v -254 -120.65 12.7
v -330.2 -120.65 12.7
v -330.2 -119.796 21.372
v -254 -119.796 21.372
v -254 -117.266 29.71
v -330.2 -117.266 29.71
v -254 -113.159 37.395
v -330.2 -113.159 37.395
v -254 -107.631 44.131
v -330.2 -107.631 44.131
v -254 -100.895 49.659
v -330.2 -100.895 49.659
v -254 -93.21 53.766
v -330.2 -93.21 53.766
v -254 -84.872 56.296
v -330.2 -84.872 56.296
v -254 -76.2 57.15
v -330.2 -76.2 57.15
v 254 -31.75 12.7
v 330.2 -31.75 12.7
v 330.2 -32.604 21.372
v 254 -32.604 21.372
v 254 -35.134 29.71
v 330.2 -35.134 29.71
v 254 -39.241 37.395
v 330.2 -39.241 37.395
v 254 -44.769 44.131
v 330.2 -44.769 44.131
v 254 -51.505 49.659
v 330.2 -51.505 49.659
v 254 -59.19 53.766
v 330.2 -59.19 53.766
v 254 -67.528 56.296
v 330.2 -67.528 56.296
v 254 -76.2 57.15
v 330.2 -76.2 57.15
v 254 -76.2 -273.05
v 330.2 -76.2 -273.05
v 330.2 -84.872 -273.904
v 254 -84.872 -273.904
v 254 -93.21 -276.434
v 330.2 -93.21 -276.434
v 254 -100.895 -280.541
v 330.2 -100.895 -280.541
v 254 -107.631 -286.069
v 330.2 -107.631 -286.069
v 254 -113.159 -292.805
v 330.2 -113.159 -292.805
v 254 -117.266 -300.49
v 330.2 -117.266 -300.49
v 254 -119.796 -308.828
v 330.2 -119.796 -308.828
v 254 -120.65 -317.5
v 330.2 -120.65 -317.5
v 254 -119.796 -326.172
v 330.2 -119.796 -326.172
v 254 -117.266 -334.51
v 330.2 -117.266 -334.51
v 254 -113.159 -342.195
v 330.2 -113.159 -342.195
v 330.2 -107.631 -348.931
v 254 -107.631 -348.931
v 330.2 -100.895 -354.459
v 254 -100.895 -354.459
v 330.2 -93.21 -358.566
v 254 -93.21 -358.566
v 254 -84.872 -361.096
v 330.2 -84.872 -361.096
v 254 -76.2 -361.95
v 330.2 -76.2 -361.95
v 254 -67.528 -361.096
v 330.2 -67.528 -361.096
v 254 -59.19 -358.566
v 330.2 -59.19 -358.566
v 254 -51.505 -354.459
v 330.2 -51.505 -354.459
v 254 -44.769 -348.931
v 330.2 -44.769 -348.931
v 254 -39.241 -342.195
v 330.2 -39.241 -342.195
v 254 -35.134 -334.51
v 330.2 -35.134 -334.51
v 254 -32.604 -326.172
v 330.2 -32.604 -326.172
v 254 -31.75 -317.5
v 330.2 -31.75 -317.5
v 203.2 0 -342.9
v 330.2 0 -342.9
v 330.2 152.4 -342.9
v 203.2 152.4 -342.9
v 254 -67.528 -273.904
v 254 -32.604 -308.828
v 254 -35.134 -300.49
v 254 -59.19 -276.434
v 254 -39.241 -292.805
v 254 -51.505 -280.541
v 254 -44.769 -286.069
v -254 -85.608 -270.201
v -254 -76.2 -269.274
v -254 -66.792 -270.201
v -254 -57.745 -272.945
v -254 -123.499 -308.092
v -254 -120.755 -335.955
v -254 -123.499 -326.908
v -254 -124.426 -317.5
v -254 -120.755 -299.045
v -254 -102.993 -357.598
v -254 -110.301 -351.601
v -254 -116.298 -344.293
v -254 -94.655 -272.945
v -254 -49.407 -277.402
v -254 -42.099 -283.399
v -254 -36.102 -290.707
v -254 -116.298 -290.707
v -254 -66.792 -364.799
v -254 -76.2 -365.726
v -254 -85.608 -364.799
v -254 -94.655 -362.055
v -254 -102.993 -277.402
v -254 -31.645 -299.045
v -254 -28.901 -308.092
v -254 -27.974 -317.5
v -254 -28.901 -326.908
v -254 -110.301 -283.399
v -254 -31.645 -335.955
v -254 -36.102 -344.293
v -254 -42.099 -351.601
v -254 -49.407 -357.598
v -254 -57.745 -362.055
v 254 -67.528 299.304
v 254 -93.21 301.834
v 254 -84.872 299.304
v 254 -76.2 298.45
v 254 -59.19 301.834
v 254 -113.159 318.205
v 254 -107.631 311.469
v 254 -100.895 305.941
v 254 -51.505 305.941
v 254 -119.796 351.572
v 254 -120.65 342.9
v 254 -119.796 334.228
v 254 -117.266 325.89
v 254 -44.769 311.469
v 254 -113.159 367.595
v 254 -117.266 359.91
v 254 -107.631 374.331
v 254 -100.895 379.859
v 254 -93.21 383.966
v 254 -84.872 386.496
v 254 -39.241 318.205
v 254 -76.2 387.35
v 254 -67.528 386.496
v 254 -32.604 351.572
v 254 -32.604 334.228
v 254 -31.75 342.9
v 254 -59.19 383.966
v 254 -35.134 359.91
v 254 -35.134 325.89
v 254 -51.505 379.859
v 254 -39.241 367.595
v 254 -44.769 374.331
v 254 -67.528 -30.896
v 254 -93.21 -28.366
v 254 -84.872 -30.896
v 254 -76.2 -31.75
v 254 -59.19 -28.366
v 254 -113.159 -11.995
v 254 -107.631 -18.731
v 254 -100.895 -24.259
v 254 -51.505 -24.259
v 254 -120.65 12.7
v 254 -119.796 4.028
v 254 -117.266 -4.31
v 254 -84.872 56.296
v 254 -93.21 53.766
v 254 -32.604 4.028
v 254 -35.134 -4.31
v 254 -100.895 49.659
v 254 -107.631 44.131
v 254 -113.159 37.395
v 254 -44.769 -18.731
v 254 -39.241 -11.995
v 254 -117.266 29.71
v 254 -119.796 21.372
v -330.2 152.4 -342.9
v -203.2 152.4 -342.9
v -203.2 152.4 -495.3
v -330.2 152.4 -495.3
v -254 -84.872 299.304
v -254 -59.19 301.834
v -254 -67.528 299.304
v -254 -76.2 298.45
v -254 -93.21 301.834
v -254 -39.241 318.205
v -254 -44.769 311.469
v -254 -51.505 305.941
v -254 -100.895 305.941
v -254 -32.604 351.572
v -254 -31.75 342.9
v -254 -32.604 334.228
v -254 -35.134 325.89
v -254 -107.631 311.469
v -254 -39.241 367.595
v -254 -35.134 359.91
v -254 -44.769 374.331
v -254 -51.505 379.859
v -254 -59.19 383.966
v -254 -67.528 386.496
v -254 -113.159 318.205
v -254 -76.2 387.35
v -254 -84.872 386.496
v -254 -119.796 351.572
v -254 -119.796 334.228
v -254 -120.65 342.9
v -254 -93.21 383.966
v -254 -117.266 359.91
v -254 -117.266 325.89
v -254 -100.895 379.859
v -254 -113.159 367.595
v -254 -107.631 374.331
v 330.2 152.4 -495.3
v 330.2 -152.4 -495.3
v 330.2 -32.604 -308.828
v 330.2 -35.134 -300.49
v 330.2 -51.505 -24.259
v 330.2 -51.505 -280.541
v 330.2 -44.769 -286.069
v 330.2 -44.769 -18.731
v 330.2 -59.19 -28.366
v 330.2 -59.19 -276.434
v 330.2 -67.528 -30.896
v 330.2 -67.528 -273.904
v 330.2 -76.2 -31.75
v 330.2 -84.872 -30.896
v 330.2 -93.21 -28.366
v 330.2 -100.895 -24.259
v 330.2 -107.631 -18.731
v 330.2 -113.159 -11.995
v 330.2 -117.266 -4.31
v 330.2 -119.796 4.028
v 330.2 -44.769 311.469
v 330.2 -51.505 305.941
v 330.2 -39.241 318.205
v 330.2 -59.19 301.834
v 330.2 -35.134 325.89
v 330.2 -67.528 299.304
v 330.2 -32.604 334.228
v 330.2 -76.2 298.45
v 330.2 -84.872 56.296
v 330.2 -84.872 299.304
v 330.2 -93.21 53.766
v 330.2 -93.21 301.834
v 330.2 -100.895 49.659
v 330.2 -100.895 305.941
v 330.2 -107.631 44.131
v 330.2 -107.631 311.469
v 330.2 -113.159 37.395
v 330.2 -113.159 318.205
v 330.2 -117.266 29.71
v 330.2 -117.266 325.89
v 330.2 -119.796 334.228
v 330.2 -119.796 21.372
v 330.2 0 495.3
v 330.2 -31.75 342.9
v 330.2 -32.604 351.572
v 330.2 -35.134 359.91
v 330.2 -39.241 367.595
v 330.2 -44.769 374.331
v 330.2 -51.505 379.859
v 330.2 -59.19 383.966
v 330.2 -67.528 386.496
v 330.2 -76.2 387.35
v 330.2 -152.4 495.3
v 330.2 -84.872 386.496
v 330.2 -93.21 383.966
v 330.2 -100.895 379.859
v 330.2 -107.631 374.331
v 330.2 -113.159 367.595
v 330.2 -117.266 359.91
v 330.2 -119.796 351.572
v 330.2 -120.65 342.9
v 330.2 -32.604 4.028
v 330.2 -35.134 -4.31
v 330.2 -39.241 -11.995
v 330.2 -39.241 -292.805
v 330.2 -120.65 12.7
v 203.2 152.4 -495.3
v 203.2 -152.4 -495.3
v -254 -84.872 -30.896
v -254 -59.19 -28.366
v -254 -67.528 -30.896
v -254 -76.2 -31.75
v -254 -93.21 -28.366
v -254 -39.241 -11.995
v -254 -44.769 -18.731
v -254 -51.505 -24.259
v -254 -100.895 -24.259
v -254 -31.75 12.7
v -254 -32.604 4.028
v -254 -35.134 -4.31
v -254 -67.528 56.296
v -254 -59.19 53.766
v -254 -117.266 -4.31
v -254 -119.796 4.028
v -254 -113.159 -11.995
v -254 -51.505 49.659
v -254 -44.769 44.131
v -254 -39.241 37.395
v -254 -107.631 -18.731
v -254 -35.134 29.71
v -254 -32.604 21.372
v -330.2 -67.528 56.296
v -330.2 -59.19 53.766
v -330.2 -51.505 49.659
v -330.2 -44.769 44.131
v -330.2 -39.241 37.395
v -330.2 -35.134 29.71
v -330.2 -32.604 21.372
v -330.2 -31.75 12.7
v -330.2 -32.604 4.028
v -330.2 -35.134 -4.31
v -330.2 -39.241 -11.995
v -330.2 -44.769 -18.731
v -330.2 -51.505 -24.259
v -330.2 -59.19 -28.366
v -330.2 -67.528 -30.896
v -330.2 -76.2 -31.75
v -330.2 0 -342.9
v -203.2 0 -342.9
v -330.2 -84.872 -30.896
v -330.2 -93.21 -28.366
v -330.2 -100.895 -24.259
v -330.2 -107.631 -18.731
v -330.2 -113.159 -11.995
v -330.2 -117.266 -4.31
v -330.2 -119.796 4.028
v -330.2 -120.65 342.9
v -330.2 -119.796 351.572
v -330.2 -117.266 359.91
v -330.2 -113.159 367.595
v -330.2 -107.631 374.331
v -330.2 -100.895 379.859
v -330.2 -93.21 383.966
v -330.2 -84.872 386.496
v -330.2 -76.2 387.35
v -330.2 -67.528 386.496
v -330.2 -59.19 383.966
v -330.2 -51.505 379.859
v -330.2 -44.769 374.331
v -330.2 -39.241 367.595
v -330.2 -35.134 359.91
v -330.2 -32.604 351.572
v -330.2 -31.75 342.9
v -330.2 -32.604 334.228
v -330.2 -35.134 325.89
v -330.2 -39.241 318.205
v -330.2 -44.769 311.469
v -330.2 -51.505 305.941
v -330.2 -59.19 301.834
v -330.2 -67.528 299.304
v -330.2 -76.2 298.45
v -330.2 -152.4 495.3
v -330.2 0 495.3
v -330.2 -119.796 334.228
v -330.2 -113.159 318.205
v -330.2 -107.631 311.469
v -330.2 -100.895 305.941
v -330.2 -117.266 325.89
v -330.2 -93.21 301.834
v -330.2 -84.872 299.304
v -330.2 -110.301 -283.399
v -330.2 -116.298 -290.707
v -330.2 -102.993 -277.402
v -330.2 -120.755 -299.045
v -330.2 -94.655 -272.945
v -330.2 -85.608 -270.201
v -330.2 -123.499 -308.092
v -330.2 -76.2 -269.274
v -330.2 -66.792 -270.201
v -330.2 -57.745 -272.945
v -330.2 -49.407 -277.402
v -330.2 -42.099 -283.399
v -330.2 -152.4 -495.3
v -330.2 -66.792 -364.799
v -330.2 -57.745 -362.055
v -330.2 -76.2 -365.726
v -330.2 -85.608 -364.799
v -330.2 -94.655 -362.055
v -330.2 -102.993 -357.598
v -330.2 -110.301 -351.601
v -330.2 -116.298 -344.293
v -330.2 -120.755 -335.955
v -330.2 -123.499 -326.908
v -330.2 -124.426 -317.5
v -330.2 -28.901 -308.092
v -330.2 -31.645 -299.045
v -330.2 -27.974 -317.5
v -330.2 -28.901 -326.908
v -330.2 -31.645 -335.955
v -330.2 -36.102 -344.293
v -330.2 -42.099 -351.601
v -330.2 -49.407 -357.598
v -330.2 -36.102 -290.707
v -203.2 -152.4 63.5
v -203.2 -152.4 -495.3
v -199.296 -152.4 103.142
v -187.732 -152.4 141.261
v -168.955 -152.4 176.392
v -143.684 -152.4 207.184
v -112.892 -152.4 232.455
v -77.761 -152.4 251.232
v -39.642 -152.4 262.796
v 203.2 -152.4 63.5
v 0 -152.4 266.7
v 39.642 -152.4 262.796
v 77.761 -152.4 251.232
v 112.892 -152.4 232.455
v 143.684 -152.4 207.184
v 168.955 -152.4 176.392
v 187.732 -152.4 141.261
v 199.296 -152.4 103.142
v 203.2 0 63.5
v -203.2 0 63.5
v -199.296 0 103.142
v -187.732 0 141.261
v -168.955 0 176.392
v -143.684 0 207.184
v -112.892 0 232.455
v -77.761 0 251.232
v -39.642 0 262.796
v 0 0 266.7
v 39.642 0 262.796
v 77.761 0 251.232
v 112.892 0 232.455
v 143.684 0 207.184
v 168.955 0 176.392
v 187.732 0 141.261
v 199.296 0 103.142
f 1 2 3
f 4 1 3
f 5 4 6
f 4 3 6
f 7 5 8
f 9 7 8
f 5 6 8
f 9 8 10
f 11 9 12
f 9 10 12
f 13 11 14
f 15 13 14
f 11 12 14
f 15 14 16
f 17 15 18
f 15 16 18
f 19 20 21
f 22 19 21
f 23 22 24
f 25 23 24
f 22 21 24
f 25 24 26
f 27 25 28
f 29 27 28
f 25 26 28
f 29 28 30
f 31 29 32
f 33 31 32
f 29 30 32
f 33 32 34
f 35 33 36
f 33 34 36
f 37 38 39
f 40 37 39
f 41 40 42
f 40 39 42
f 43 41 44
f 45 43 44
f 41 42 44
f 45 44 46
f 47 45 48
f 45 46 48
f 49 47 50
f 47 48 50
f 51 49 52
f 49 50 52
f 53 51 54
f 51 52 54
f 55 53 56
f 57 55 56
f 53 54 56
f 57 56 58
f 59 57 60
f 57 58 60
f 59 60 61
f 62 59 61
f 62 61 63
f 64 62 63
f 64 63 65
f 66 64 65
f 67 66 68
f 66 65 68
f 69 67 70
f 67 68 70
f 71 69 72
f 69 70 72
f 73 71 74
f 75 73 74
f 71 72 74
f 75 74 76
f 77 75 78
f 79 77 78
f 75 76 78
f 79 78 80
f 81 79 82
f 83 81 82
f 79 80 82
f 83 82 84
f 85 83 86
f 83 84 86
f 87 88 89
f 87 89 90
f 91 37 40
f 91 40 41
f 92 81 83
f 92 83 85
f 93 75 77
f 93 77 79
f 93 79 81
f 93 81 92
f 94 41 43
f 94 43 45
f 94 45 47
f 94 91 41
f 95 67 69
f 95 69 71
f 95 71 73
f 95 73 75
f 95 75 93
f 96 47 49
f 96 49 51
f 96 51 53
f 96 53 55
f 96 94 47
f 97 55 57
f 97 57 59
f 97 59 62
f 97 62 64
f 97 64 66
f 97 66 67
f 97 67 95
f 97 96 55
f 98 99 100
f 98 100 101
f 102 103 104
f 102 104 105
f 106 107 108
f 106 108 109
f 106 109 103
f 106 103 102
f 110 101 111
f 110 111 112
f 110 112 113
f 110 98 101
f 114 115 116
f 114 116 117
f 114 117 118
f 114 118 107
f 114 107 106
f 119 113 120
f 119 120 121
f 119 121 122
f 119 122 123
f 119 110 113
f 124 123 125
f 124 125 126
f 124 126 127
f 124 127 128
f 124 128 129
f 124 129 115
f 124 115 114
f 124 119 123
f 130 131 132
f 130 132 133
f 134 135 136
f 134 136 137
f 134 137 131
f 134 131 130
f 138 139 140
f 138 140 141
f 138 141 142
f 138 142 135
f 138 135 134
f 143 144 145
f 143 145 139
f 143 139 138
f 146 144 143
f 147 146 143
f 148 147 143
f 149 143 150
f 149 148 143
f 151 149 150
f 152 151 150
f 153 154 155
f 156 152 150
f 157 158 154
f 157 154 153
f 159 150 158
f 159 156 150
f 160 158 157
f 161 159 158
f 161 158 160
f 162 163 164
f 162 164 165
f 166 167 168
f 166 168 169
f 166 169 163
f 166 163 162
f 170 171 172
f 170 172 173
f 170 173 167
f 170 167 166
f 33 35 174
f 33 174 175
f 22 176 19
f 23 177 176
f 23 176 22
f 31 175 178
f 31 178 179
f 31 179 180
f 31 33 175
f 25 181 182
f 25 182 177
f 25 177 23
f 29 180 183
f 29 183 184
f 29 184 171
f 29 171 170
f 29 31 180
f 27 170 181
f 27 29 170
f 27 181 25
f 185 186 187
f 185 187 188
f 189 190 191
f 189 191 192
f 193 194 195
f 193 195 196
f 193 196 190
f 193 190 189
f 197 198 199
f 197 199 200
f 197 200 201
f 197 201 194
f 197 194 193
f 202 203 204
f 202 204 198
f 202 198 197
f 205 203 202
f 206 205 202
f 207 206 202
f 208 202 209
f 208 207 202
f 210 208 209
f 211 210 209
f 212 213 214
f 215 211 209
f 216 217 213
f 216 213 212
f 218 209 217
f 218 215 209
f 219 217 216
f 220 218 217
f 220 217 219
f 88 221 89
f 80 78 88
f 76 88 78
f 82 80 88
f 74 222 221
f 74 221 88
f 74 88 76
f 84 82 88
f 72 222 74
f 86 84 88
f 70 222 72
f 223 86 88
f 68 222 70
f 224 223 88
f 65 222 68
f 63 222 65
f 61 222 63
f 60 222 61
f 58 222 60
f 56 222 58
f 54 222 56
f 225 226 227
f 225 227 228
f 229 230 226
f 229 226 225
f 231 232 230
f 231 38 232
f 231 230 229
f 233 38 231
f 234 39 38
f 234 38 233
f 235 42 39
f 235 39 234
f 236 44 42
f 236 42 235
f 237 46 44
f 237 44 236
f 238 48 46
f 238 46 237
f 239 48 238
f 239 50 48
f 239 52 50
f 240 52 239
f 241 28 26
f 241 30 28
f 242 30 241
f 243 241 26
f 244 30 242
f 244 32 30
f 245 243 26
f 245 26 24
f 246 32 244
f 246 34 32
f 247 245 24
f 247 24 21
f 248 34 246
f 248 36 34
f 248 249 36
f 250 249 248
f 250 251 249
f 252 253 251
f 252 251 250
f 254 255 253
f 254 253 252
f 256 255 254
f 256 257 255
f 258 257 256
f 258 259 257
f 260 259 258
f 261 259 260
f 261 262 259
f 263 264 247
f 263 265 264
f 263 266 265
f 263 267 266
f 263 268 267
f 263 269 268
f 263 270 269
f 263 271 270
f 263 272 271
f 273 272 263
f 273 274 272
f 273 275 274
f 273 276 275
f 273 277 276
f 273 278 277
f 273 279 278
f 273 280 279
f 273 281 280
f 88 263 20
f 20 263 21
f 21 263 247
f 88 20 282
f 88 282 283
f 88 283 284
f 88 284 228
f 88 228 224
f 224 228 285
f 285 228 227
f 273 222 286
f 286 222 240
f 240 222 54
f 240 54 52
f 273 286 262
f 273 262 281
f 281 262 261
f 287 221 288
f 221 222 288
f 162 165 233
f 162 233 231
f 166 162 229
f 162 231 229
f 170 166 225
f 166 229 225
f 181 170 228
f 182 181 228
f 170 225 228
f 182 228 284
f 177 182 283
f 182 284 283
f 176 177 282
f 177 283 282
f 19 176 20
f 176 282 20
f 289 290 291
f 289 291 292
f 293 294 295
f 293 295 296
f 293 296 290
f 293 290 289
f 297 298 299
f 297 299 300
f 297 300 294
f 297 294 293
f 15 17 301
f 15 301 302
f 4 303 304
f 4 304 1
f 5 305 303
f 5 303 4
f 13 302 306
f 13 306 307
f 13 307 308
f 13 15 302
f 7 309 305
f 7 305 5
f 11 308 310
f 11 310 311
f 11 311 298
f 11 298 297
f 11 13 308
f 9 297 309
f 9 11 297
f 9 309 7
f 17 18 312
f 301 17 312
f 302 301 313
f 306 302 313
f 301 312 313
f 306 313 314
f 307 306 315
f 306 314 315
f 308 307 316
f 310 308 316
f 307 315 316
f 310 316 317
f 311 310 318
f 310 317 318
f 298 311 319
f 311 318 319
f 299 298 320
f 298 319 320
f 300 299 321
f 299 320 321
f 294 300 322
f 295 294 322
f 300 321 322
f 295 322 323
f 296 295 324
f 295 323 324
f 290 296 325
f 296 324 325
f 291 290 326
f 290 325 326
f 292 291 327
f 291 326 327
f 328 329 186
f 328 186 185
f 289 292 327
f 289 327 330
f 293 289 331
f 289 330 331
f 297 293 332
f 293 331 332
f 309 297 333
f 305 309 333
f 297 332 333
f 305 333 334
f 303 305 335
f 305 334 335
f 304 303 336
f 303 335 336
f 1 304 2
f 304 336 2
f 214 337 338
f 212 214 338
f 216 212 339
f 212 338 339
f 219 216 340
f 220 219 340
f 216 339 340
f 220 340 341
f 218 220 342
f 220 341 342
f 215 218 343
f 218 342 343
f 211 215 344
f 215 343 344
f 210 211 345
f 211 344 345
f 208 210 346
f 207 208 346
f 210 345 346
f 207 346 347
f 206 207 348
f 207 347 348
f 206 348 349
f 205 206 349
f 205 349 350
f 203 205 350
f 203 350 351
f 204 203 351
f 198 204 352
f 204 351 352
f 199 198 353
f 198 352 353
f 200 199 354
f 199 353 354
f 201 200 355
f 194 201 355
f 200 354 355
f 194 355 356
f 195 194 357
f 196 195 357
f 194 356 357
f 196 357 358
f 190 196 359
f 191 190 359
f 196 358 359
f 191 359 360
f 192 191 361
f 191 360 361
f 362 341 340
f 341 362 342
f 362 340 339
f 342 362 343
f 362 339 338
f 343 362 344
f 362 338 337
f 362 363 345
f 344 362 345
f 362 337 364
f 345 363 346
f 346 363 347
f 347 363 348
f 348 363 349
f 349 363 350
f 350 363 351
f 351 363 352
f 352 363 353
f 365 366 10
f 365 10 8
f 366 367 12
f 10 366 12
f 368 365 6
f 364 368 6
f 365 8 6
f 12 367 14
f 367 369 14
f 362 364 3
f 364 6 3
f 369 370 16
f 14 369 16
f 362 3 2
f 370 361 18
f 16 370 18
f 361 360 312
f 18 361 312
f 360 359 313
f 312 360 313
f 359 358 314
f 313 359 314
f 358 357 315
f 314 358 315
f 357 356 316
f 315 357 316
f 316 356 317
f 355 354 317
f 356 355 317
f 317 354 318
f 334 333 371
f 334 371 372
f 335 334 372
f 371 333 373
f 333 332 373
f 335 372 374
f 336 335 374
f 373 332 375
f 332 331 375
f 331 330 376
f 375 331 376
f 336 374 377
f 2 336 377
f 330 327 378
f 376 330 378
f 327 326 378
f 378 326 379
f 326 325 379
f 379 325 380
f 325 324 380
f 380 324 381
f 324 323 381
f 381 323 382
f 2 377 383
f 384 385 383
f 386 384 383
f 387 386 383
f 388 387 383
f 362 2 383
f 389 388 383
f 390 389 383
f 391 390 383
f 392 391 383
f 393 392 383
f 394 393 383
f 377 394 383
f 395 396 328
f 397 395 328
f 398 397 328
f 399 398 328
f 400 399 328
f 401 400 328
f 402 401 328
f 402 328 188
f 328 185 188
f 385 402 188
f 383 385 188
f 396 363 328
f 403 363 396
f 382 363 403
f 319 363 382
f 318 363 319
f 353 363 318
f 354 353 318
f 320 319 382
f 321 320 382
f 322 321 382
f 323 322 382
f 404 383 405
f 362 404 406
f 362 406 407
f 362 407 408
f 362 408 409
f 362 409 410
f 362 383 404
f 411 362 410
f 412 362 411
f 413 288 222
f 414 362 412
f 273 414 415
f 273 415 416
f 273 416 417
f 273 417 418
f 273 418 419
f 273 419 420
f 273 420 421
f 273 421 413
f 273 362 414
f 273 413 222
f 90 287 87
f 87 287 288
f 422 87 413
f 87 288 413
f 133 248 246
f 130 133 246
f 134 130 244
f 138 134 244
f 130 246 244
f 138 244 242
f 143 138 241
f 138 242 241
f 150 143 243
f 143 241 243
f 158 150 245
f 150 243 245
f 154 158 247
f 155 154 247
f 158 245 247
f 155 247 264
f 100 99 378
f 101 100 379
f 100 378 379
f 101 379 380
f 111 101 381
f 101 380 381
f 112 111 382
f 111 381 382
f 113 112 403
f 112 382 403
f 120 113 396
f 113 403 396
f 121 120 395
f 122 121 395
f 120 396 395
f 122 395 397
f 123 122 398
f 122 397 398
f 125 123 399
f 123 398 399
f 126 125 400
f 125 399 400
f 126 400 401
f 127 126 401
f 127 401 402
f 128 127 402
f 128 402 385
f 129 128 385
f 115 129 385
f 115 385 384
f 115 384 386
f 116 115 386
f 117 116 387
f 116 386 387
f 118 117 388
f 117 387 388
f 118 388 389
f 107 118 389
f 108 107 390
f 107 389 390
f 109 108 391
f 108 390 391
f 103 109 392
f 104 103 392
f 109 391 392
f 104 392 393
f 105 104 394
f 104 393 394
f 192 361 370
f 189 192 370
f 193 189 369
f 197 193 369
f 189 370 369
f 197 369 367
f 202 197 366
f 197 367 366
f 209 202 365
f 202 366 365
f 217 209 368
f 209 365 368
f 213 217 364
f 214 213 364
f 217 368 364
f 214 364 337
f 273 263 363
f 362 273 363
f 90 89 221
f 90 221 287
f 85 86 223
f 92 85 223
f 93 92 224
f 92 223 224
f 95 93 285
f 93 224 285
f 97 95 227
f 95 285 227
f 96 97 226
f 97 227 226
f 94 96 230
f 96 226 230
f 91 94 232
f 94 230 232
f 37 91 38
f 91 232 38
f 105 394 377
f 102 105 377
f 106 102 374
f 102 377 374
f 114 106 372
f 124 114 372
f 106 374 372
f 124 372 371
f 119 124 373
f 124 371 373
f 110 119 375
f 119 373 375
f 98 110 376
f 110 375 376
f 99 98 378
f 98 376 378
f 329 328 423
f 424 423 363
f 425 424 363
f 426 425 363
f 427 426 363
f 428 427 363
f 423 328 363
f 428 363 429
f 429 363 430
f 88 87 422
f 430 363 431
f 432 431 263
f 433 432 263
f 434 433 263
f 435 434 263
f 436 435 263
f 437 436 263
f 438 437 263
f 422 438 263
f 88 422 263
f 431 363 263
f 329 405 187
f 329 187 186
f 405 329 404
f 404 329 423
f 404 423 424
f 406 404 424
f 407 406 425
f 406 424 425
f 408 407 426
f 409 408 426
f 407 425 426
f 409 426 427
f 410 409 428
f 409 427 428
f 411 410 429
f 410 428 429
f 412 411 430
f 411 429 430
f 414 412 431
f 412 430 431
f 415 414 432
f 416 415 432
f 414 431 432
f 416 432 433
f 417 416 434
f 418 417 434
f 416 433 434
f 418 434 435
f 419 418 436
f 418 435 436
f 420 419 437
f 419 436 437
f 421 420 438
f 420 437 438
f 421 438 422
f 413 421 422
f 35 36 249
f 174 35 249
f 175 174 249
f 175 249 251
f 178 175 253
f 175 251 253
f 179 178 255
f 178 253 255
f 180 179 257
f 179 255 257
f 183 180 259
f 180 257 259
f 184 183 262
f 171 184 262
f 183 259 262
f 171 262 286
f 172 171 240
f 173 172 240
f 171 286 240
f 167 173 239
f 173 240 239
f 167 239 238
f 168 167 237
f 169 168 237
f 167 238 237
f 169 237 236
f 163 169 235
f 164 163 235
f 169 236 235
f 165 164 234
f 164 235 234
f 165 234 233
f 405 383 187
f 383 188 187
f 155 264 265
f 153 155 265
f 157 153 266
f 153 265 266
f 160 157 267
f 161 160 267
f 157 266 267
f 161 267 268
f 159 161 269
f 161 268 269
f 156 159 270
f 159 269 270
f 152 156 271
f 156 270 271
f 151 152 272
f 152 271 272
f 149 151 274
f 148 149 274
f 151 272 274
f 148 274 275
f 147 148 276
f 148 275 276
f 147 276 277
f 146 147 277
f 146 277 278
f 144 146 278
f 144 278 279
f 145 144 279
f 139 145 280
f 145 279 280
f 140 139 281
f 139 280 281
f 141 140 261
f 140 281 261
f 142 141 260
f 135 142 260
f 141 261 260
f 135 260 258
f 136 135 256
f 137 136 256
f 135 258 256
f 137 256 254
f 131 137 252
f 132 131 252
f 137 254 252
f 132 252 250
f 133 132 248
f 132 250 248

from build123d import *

# Parameters (mm, degrees)
F1_DEPTH = 152.4
F2_W     = 127
F2_H     = 152.4
F3_DEPTH = 152.4
F5_DEPTH = 76.2
F7_DEPTH = 76.2


with BuildPart() as f1:
    # F0 (on Front) → F1 (new body)
    with BuildSketch(Plane.XZ):
        with BuildLine():
            Line((-330.2, 495.3), (-330.2, -495.3))
            Line((-330.2, -495.3), (-203.2, -495.3))
            Line((-203.2, -495.3), (-203.2, 63.5))
            ThreePointArc((-203.2, 63.5), (0, 266.7), (203.2, 63.5))
            Line((203.2, 63.5), (203.2, -495.3))
            Line((203.2, -495.3), (330.2, -495.3))
            Line((330.2, -495.3), (330.2, 495.3))
            Line((330.2, 495.3), (-330.2, 495.3))
        make_face()
    extrude(amount=F1_DEPTH)

    # F2 (on face) → F3 (join)
    with BuildSketch(Plane(origin=(0, 0, 0), x_dir=(-1, 0, 0), z_dir=(0, 1, 0))):
        with Locations((-266.7, -419.1)):
            Rectangle(F2_W, F2_H)
        with Locations((266.7, -419.1)):
            Rectangle(F2_W, F2_H)
    extrude(amount=F3_DEPTH)

    # F4 (on face) → F5 (cut)
    with BuildSketch(Plane(origin=(-330.2, 0, 0), x_dir=(0, -1, 0), z_dir=(-1, 0, 0))):
        with BuildLine():
            ThreePointArc((76.2, 298.45), (107.630896, 311.469104), (120.65, 342.9))
            Line((120.65, 342.9), (76.2, 342.9))
            Line((76.2, 342.9), (76.2, 298.45))
        make_face()
        with BuildLine():
            Line((76.2, 342.9), (120.65, 342.9))
            ThreePointArc((120.65, 342.9), (44.769104, 374.330896), (76.2, 298.45))
            Line((76.2, 298.45), (76.2, 342.9))
        make_face()
        with BuildLine():
            ThreePointArc((124.425977, -317.5), (110.300915, -283.399085), (76.2, -269.274023))
            ThreePointArc((76.2, -269.274023), (42.099085, -351.600915), (124.425977, -317.5))
        make_face()
        with BuildLine():
            ThreePointArc((120.65, 12.7), (107.630896, 44.130896), (76.2, 57.15))
            Line((76.2, 57.15), (76.2, 12.7))
            Line((76.2, 12.7), (76.2, -31.75))
            ThreePointArc((76.2, -31.75), (107.630896, -18.730896), (120.65, 12.7))
        make_face()
        with BuildLine():
            Line((76.2, 12.7), (76.2, 57.15))
            ThreePointArc((76.2, 57.15), (31.75, 12.7), (76.2, -31.75))
            Line((76.2, -31.75), (76.2, 12.7))
        make_face()
    extrude(amount=-F5_DEPTH, mode=Mode.SUBTRACT)

    # F6 (on face) → F7 (cut)
    with BuildSketch(Plane.YZ.offset(330.2)):
        with BuildLine():
            ThreePointArc((-76.2, 298.45), (-44.769104, 311.469104), (-31.75, 342.9))
            ThreePointArc((-31.75, 342.9), (-107.630896, 374.330896), (-76.2, 298.45))
        make_face()
        with BuildLine():
            ThreePointArc((-31.75, -317.5), (-44.769104, -286.069104), (-76.2, -273.05))
            ThreePointArc((-76.2, -273.05), (-107.630896, -348.930896), (-31.75, -317.5))
        make_face()
        with BuildLine():
            ThreePointArc((-31.75, 12.7), (-44.769104, 44.130896), (-76.2, 57.15))
            Line((-76.2, 57.15), (-76.2, 12.7))
            Line((-76.2, 12.7), (-76.2, -31.75))
            ThreePointArc((-76.2, -31.75), (-44.769104, -18.730896), (-31.75, 12.7))
        make_face()
        with BuildLine():
            Line((-76.2, 12.7), (-76.2, 57.15))
            ThreePointArc((-76.2, 57.15), (-120.65, 12.7), (-76.2, -31.75))
            Line((-76.2, -31.75), (-76.2, 12.7))
        make_face()
    extrude(amount=-F7_DEPTH, mode=Mode.SUBTRACT)


solid = f1.part
